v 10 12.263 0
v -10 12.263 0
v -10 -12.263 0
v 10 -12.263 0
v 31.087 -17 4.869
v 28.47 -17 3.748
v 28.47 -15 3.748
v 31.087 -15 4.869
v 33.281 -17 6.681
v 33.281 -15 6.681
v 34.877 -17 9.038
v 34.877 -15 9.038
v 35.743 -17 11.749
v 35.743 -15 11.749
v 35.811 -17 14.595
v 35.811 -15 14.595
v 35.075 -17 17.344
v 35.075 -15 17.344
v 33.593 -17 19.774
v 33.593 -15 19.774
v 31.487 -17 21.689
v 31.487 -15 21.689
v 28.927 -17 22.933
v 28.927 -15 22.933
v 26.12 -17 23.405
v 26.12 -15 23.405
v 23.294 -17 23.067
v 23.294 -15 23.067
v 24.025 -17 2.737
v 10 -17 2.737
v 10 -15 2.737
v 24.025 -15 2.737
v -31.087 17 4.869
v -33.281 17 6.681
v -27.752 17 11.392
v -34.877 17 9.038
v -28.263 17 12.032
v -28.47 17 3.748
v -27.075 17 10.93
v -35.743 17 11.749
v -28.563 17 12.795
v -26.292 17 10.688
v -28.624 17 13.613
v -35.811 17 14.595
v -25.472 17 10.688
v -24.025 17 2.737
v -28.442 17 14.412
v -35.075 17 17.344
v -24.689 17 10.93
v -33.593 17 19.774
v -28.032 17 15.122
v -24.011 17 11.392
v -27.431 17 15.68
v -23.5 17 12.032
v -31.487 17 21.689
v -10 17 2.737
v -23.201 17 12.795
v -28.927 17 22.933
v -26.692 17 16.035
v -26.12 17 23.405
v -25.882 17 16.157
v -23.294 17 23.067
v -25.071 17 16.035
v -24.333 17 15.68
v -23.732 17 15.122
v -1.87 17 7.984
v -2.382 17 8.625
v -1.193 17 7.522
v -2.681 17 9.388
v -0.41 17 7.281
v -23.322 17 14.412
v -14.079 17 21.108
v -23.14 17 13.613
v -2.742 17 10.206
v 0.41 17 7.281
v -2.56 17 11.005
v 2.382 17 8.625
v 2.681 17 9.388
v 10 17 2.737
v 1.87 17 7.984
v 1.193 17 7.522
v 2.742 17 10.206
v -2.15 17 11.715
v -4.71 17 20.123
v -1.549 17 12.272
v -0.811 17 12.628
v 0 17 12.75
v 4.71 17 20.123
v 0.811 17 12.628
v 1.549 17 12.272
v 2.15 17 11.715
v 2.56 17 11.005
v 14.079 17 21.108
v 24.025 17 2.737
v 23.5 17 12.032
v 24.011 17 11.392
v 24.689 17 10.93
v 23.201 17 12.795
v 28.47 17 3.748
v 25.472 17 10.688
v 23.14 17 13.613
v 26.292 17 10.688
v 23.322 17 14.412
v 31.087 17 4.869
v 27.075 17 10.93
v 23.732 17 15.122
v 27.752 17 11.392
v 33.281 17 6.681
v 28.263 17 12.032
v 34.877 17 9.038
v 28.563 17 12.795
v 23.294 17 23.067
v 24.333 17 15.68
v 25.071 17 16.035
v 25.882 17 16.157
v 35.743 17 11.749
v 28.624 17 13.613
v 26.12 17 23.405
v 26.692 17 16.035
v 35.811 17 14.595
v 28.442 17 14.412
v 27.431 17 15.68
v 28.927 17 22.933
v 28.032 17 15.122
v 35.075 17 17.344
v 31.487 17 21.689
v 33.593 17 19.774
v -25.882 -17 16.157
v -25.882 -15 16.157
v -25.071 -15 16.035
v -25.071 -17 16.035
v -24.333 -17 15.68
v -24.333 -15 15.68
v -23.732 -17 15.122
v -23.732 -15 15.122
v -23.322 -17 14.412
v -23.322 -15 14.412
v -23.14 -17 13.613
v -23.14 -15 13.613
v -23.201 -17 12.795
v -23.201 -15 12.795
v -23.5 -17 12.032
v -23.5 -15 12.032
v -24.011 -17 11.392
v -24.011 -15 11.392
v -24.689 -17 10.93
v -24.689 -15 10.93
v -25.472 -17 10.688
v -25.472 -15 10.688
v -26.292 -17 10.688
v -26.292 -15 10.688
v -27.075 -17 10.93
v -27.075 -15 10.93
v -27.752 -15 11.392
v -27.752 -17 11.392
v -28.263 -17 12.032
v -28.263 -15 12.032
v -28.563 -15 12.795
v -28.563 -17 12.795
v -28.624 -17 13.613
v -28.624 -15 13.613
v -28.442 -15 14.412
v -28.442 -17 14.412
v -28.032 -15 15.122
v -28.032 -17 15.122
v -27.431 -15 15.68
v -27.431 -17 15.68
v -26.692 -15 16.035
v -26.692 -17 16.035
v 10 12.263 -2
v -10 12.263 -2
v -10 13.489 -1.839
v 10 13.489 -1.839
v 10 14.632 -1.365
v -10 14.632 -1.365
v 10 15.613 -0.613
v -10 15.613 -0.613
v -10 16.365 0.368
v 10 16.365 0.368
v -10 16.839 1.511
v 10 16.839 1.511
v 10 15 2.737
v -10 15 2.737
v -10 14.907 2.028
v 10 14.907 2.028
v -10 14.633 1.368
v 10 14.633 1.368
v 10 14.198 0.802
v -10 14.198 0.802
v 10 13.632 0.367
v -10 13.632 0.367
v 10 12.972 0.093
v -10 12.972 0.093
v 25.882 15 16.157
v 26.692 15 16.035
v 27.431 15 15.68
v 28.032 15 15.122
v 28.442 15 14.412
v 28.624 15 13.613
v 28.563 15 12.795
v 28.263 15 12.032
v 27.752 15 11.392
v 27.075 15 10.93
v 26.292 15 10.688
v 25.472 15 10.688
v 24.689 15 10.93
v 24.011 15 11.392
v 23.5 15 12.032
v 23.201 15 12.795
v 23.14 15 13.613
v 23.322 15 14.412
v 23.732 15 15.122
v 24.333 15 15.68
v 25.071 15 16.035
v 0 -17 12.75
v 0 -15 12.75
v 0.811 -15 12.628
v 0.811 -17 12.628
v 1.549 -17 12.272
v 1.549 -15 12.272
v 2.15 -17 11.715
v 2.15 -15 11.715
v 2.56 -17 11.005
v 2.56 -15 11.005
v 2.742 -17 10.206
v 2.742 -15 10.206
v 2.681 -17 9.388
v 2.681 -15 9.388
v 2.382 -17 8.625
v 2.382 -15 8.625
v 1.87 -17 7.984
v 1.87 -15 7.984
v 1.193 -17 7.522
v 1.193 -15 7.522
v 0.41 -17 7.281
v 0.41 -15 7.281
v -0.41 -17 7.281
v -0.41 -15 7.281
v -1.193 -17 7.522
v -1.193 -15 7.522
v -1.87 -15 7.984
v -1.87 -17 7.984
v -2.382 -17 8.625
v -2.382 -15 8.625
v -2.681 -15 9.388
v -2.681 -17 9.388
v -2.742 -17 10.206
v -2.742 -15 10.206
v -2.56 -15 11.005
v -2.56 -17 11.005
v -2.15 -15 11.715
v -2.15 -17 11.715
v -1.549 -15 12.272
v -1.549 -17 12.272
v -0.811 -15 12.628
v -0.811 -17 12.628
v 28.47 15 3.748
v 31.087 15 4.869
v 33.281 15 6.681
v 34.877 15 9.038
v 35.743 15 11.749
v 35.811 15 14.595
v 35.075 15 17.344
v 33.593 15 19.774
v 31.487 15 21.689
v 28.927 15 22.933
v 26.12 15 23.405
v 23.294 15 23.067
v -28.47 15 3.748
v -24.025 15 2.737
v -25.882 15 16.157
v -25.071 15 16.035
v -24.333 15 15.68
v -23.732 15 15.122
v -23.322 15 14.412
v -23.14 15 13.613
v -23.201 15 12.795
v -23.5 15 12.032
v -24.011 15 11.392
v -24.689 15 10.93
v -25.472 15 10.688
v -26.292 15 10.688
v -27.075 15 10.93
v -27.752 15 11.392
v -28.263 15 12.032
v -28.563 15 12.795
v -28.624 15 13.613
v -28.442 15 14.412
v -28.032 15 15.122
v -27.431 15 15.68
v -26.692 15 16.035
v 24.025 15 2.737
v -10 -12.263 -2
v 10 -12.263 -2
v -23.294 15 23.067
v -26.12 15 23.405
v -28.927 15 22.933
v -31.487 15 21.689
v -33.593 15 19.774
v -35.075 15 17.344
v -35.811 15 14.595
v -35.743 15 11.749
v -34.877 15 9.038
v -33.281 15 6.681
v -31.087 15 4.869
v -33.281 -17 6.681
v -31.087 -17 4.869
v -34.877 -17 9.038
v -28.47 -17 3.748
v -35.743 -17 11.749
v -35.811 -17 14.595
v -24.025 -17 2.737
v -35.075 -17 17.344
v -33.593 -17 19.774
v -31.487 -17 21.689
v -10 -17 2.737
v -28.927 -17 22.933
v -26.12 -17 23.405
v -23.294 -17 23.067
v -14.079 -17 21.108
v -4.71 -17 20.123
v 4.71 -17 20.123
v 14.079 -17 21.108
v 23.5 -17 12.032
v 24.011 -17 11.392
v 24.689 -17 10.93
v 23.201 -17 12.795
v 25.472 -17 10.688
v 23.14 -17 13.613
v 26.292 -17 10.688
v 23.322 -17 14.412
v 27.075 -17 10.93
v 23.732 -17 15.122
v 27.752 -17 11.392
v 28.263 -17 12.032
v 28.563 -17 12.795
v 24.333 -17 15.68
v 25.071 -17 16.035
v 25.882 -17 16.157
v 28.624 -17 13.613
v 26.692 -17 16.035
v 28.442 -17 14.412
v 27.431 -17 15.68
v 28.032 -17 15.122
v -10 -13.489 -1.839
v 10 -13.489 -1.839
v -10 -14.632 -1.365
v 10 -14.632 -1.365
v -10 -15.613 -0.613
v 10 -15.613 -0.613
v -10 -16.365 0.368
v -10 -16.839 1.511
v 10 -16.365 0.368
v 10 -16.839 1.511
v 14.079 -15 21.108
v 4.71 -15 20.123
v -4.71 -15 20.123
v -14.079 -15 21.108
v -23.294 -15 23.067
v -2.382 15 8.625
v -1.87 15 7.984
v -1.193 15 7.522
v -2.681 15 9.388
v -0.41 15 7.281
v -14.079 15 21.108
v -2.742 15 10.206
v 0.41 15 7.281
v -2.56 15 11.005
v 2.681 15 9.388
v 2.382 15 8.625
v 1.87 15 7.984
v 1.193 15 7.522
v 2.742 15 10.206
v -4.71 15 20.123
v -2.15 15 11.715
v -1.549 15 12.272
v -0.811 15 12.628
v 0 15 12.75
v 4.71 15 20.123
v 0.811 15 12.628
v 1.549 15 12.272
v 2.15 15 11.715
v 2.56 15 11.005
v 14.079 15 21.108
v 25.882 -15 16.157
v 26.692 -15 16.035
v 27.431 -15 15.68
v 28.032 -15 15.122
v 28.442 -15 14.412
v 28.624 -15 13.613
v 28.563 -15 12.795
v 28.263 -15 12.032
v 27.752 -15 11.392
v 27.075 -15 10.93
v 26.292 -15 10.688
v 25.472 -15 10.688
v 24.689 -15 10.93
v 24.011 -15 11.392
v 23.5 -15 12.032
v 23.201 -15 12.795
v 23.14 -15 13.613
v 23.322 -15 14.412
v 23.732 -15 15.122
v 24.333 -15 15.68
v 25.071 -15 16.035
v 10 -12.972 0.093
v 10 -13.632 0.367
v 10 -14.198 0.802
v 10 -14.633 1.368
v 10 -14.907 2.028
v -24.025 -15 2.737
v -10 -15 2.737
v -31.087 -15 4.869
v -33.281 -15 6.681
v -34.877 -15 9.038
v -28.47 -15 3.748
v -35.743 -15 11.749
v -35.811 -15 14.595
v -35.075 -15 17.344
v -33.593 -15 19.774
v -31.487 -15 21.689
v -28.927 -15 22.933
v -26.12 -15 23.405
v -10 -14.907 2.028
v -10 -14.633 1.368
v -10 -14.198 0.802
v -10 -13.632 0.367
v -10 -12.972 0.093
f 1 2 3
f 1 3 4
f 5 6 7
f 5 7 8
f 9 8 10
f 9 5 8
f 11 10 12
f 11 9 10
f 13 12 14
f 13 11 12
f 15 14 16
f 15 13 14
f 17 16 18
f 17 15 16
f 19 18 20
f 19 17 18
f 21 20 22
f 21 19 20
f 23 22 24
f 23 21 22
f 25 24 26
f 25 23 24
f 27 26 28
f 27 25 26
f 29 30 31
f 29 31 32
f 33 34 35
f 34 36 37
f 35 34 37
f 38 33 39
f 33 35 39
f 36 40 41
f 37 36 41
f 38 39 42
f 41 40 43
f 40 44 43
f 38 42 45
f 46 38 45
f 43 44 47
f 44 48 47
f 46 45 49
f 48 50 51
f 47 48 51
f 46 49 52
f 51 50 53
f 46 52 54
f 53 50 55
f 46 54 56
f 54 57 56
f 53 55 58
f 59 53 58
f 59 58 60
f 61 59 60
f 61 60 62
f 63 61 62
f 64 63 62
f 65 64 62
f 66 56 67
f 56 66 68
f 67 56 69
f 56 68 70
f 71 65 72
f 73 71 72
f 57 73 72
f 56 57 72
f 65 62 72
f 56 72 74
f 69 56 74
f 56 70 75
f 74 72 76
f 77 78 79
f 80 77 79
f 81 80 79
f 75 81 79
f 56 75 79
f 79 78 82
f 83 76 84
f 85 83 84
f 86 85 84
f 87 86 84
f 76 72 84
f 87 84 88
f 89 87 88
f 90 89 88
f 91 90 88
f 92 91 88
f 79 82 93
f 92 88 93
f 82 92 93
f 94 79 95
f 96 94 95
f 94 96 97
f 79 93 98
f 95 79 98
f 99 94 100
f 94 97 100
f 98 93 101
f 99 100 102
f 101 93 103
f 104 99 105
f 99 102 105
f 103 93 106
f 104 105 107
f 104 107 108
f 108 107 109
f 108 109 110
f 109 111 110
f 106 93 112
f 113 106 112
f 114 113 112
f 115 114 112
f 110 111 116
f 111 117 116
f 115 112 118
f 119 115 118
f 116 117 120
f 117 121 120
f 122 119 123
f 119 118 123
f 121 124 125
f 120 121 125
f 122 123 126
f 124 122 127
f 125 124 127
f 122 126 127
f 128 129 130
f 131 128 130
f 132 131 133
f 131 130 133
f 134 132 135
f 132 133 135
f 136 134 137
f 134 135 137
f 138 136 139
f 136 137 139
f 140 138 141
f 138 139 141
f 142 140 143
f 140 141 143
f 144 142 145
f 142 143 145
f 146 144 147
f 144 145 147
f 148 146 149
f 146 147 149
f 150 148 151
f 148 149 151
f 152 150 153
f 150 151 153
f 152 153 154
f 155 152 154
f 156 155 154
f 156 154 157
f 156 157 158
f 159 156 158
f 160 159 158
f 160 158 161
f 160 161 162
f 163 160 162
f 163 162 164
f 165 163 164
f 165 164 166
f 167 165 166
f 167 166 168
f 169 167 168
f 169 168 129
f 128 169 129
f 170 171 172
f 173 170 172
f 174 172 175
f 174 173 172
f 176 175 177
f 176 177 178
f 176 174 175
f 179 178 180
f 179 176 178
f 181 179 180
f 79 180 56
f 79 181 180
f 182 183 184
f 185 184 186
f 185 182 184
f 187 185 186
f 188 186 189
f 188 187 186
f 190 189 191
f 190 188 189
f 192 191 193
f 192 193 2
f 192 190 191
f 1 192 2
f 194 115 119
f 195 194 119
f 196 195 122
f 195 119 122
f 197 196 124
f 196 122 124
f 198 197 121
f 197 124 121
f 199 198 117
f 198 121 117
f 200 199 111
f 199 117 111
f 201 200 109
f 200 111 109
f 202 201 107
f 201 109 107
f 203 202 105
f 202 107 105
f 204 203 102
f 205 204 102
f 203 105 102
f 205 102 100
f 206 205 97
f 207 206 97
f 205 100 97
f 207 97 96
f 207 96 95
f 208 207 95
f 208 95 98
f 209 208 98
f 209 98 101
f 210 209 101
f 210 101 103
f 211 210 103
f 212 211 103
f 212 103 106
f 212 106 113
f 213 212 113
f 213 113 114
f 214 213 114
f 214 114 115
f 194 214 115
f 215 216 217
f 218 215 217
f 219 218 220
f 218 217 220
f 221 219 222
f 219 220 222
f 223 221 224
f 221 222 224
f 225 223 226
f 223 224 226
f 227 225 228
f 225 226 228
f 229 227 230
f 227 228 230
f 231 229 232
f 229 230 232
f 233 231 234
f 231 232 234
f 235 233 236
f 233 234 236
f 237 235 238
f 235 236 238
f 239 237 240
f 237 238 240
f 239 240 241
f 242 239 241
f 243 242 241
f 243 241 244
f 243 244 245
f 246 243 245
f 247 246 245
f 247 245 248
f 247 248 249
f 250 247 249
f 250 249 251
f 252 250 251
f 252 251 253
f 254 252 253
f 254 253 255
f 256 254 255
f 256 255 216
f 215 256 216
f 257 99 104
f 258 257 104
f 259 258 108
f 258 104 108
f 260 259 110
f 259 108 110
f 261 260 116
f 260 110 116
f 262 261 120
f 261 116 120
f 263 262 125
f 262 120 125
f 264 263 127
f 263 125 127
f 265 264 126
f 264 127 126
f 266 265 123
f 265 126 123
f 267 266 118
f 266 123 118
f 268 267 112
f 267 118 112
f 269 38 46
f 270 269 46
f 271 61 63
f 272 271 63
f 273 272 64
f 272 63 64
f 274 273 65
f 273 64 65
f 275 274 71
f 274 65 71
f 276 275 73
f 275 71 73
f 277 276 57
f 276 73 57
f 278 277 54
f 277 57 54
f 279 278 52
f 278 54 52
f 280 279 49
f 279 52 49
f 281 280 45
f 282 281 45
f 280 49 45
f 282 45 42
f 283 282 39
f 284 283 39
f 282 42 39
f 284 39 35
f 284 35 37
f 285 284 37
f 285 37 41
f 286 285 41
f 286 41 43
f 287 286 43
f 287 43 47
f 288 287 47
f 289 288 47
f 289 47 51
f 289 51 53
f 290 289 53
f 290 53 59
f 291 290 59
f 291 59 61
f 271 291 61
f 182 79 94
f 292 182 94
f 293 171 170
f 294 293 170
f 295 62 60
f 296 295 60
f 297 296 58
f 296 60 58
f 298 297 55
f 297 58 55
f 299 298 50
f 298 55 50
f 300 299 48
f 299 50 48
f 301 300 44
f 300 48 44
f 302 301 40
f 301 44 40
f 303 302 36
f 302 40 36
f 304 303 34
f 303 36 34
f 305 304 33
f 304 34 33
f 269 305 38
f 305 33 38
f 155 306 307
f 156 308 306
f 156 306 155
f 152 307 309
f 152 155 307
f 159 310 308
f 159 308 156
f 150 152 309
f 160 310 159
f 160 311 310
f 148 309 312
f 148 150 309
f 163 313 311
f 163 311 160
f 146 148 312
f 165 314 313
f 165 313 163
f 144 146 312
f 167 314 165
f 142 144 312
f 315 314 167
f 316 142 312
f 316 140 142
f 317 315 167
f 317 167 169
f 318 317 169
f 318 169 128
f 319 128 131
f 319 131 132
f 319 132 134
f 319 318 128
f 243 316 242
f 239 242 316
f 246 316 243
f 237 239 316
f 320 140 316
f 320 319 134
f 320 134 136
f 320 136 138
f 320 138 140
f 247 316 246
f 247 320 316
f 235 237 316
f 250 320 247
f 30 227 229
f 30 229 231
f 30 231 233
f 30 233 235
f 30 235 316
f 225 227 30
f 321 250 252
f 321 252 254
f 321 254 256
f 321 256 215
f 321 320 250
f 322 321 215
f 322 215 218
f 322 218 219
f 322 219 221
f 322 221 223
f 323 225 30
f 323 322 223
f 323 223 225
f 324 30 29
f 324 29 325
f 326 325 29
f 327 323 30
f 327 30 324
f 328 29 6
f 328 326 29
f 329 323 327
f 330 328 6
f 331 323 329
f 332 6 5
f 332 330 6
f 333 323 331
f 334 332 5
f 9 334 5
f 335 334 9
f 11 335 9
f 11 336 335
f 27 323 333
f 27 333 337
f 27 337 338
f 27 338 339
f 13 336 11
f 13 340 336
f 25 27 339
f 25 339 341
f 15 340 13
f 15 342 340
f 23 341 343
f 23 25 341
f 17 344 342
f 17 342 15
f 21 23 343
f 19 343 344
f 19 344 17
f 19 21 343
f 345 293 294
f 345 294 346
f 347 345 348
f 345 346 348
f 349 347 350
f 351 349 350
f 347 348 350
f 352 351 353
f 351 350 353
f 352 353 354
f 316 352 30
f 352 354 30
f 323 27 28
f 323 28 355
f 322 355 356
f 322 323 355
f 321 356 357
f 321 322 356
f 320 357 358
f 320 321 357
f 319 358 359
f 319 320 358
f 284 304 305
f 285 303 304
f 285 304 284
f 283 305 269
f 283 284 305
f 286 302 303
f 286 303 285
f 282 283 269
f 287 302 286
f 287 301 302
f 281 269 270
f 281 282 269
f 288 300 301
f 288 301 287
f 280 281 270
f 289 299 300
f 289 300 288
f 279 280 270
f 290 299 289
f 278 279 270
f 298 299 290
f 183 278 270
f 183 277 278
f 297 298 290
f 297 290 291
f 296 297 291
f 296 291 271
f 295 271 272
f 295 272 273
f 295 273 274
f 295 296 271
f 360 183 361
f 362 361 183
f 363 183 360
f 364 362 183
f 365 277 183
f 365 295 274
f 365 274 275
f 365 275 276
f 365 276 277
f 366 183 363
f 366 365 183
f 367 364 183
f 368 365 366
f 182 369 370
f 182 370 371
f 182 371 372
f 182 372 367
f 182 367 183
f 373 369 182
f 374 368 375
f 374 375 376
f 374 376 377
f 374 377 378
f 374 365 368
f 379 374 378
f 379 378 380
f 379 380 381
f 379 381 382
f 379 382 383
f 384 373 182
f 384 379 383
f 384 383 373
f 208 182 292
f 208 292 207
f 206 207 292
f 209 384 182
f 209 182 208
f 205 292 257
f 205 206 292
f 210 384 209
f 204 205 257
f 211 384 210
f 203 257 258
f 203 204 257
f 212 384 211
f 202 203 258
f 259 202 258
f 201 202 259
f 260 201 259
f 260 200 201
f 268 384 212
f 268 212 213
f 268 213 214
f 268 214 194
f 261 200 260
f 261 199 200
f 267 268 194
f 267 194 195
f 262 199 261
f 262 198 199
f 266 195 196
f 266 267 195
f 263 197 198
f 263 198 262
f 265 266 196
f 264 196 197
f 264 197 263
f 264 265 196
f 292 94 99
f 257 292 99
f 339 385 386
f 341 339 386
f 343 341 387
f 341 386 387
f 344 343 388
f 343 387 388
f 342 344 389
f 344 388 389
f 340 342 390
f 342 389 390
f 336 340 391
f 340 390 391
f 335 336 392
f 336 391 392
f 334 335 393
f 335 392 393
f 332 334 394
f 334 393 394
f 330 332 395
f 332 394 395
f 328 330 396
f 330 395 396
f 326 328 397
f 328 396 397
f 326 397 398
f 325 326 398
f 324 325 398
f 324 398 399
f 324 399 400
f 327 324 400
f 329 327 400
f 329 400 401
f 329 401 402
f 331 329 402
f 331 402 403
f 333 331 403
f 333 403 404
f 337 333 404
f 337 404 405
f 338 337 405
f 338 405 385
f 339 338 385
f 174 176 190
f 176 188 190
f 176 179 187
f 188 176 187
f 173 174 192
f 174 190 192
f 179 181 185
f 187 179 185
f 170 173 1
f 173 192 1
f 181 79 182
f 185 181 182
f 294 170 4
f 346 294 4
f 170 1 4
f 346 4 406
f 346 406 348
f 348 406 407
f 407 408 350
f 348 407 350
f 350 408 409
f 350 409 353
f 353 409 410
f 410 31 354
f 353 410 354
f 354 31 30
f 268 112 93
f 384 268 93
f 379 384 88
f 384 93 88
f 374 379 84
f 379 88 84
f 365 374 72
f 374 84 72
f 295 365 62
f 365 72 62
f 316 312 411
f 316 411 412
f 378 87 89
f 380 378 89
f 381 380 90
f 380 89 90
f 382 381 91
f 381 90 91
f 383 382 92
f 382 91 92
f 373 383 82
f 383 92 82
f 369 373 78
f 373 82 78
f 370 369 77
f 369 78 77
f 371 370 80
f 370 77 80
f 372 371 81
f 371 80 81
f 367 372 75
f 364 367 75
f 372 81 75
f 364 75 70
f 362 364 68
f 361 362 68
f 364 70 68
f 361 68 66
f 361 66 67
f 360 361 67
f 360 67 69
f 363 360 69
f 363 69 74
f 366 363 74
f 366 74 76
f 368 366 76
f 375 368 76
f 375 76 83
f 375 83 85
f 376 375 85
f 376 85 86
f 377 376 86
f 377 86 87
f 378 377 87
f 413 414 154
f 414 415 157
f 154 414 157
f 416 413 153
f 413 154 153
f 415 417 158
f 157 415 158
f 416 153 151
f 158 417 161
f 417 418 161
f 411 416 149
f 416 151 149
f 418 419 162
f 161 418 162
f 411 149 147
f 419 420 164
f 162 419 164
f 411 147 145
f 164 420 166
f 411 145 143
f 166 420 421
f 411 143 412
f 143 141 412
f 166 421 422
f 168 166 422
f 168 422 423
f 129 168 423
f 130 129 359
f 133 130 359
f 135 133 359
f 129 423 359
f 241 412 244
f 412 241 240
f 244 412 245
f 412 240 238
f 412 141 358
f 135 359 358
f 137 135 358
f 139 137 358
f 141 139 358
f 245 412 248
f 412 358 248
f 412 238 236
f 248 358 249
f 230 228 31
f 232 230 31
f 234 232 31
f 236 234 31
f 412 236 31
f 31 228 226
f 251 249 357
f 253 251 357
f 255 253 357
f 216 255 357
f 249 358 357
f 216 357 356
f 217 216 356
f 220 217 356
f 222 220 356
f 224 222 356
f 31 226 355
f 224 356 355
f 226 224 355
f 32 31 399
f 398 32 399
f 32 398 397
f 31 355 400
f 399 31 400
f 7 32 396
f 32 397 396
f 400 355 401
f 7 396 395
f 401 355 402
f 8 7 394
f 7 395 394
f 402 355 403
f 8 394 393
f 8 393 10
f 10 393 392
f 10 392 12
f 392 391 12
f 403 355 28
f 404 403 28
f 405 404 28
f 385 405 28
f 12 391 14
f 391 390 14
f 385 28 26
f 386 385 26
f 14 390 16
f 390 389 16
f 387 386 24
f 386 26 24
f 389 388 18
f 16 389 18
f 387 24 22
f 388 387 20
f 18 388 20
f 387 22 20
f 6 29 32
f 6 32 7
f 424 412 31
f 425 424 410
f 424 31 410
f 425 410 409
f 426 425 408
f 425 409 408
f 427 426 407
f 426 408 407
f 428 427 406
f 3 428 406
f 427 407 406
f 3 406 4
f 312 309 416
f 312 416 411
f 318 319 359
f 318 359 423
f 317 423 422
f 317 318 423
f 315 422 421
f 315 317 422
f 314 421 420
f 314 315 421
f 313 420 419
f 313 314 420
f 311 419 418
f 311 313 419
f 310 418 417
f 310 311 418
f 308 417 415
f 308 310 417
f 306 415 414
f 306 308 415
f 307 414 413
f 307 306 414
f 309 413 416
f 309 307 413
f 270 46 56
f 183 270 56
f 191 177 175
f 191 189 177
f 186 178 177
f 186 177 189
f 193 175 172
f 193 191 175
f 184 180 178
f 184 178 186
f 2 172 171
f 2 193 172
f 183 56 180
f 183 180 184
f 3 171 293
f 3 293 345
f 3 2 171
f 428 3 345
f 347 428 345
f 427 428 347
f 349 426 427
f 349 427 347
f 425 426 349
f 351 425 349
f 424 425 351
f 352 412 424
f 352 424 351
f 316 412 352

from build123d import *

# Parameters (mm, degrees)
SKETCH_1_W                       = 20
SKETCH_1_H                       = 34
SM_BASE_FLANGE_1_DEPTH           = 2
SM_EDGE_FLANGE_1_STRIP_W         = 13.4732
SM_EDGE_FLANGE_1_STRIP_H         = 2
SM_EDGE_FLANGE_1_STRIP_CUT_DEPTH = 20
SM_EDGE_FLANGE_1_DEPTH           = 20
SM_EDGE_FLANGE_1_FLAT_DEPTH      = 2
SKETCH_9_R                       = 2.75
CUT_EXTRUDE_1_DEPTH              = 55.693859429


# Sheet-metal steps are written as plain solids
with BuildPart() as part:
    # Sketch 1 → 基体-法兰1 (new body)
    with BuildSketch(Plane.XY):
        Rectangle(SKETCH_1_W, SKETCH_1_H)
    extrude(amount=-SM_BASE_FLANGE_1_DEPTH)

    # 边线-法兰1 strip (across the edge) → 边线-法兰1 strip cut (cut)
    with BuildSketch(Plane(origin=(10, 17, 0), x_dir=(0, -1, 0), z_dir=(-1, 0, 0))):
        with Locations((-2, -1)):
            Rectangle(SM_EDGE_FLANGE_1_STRIP_W, SM_EDGE_FLANGE_1_STRIP_H)
    sm_edge_flange_1_strip_cut = extrude(amount=SM_EDGE_FLANGE_1_STRIP_CUT_DEPTH, mode=Mode.SUBTRACT)

    # 边线-法兰1 bend section (across the edge) → 边线-法兰1 (add)
    with BuildSketch(Plane(origin=(10, 17, 0), x_dir=(0, -1, 0), z_dir=(-1, 0, 0))):
        with BuildLine():
            Line((0, 2.7366), (2, 2.7366))
            ThreePointArc((2, 2.7366), (2.801531583, 0.801531583), (4.7366, 0))
            Line((4.7366, 0), (4.7366, -2))
            ThreePointArc((4.7366, -2), (1.38731802, -0.61268198), (0, 2.7366))
        make_face()
    sm_edge_flange_1 = extrude(amount=SM_EDGE_FLANGE_1_DEPTH)

    # 边线-法兰1 profile (on flange) → 边线-法兰1 flat (add)
    with BuildSketch(Plane.XZ.offset(-17)):
        with BuildLine():
            ThreePointArc((23.293714059, 23.066675634), (0, 20), (-23.293714059, 23.066675634))
            ThreePointArc((-23.293714059, 23.066675634), (-35.541162773, 15.995607822), (-28.470094961, 3.748159108))
            Line((-28.470094961, 3.748159108), (-24.025119684, 2.7366))
            Line((-24.025119684, 2.7366), (24.025119684, 2.7366))
            Line((24.025119684, 2.7366), (28.470094961, 3.748159108))
            ThreePointArc((28.470094961, 3.748159108), (35.541162773, 15.995607822), (23.293714059, 23.066675634))
        make_face()
    sm_edge_flange_1_flat = extrude(amount=SM_EDGE_FLANGE_1_FLAT_DEPTH)

    # 镜向1: 边线-法兰1 strip cut, 边线-法兰1, 边线-法兰1 flat across plane
    add(sm_edge_flange_1_strip_cut.mirror(Plane.ZX), mode=Mode.SUBTRACT)
    add(sm_edge_flange_1.mirror(Plane.ZX))
    add(sm_edge_flange_1_flat.mirror(Plane.ZX))

    # 草图9 → 切除-拉伸1 (cut, through all)
    with BuildSketch(Plane(origin=(0, 17, 0), x_dir=(1, 0, 0), z_dir=(0, 1, 0))):
        with Locations(Location((0, -10, 0), (0, 0, 270))):
            Circle(SKETCH_9_R)
        with Locations(Location((25.88190451, -13.407417371, 0), (0, 0, 270))):
            Circle(SKETCH_9_R)
        with Locations(Location((-25.88190451, -13.407417371, 0), (0, 0, 270))):
            Circle(SKETCH_9_R)
    extrude(amount=-CUT_EXTRUDE_1_DEPTH, mode=Mode.SUBTRACT)


solid = part.part
